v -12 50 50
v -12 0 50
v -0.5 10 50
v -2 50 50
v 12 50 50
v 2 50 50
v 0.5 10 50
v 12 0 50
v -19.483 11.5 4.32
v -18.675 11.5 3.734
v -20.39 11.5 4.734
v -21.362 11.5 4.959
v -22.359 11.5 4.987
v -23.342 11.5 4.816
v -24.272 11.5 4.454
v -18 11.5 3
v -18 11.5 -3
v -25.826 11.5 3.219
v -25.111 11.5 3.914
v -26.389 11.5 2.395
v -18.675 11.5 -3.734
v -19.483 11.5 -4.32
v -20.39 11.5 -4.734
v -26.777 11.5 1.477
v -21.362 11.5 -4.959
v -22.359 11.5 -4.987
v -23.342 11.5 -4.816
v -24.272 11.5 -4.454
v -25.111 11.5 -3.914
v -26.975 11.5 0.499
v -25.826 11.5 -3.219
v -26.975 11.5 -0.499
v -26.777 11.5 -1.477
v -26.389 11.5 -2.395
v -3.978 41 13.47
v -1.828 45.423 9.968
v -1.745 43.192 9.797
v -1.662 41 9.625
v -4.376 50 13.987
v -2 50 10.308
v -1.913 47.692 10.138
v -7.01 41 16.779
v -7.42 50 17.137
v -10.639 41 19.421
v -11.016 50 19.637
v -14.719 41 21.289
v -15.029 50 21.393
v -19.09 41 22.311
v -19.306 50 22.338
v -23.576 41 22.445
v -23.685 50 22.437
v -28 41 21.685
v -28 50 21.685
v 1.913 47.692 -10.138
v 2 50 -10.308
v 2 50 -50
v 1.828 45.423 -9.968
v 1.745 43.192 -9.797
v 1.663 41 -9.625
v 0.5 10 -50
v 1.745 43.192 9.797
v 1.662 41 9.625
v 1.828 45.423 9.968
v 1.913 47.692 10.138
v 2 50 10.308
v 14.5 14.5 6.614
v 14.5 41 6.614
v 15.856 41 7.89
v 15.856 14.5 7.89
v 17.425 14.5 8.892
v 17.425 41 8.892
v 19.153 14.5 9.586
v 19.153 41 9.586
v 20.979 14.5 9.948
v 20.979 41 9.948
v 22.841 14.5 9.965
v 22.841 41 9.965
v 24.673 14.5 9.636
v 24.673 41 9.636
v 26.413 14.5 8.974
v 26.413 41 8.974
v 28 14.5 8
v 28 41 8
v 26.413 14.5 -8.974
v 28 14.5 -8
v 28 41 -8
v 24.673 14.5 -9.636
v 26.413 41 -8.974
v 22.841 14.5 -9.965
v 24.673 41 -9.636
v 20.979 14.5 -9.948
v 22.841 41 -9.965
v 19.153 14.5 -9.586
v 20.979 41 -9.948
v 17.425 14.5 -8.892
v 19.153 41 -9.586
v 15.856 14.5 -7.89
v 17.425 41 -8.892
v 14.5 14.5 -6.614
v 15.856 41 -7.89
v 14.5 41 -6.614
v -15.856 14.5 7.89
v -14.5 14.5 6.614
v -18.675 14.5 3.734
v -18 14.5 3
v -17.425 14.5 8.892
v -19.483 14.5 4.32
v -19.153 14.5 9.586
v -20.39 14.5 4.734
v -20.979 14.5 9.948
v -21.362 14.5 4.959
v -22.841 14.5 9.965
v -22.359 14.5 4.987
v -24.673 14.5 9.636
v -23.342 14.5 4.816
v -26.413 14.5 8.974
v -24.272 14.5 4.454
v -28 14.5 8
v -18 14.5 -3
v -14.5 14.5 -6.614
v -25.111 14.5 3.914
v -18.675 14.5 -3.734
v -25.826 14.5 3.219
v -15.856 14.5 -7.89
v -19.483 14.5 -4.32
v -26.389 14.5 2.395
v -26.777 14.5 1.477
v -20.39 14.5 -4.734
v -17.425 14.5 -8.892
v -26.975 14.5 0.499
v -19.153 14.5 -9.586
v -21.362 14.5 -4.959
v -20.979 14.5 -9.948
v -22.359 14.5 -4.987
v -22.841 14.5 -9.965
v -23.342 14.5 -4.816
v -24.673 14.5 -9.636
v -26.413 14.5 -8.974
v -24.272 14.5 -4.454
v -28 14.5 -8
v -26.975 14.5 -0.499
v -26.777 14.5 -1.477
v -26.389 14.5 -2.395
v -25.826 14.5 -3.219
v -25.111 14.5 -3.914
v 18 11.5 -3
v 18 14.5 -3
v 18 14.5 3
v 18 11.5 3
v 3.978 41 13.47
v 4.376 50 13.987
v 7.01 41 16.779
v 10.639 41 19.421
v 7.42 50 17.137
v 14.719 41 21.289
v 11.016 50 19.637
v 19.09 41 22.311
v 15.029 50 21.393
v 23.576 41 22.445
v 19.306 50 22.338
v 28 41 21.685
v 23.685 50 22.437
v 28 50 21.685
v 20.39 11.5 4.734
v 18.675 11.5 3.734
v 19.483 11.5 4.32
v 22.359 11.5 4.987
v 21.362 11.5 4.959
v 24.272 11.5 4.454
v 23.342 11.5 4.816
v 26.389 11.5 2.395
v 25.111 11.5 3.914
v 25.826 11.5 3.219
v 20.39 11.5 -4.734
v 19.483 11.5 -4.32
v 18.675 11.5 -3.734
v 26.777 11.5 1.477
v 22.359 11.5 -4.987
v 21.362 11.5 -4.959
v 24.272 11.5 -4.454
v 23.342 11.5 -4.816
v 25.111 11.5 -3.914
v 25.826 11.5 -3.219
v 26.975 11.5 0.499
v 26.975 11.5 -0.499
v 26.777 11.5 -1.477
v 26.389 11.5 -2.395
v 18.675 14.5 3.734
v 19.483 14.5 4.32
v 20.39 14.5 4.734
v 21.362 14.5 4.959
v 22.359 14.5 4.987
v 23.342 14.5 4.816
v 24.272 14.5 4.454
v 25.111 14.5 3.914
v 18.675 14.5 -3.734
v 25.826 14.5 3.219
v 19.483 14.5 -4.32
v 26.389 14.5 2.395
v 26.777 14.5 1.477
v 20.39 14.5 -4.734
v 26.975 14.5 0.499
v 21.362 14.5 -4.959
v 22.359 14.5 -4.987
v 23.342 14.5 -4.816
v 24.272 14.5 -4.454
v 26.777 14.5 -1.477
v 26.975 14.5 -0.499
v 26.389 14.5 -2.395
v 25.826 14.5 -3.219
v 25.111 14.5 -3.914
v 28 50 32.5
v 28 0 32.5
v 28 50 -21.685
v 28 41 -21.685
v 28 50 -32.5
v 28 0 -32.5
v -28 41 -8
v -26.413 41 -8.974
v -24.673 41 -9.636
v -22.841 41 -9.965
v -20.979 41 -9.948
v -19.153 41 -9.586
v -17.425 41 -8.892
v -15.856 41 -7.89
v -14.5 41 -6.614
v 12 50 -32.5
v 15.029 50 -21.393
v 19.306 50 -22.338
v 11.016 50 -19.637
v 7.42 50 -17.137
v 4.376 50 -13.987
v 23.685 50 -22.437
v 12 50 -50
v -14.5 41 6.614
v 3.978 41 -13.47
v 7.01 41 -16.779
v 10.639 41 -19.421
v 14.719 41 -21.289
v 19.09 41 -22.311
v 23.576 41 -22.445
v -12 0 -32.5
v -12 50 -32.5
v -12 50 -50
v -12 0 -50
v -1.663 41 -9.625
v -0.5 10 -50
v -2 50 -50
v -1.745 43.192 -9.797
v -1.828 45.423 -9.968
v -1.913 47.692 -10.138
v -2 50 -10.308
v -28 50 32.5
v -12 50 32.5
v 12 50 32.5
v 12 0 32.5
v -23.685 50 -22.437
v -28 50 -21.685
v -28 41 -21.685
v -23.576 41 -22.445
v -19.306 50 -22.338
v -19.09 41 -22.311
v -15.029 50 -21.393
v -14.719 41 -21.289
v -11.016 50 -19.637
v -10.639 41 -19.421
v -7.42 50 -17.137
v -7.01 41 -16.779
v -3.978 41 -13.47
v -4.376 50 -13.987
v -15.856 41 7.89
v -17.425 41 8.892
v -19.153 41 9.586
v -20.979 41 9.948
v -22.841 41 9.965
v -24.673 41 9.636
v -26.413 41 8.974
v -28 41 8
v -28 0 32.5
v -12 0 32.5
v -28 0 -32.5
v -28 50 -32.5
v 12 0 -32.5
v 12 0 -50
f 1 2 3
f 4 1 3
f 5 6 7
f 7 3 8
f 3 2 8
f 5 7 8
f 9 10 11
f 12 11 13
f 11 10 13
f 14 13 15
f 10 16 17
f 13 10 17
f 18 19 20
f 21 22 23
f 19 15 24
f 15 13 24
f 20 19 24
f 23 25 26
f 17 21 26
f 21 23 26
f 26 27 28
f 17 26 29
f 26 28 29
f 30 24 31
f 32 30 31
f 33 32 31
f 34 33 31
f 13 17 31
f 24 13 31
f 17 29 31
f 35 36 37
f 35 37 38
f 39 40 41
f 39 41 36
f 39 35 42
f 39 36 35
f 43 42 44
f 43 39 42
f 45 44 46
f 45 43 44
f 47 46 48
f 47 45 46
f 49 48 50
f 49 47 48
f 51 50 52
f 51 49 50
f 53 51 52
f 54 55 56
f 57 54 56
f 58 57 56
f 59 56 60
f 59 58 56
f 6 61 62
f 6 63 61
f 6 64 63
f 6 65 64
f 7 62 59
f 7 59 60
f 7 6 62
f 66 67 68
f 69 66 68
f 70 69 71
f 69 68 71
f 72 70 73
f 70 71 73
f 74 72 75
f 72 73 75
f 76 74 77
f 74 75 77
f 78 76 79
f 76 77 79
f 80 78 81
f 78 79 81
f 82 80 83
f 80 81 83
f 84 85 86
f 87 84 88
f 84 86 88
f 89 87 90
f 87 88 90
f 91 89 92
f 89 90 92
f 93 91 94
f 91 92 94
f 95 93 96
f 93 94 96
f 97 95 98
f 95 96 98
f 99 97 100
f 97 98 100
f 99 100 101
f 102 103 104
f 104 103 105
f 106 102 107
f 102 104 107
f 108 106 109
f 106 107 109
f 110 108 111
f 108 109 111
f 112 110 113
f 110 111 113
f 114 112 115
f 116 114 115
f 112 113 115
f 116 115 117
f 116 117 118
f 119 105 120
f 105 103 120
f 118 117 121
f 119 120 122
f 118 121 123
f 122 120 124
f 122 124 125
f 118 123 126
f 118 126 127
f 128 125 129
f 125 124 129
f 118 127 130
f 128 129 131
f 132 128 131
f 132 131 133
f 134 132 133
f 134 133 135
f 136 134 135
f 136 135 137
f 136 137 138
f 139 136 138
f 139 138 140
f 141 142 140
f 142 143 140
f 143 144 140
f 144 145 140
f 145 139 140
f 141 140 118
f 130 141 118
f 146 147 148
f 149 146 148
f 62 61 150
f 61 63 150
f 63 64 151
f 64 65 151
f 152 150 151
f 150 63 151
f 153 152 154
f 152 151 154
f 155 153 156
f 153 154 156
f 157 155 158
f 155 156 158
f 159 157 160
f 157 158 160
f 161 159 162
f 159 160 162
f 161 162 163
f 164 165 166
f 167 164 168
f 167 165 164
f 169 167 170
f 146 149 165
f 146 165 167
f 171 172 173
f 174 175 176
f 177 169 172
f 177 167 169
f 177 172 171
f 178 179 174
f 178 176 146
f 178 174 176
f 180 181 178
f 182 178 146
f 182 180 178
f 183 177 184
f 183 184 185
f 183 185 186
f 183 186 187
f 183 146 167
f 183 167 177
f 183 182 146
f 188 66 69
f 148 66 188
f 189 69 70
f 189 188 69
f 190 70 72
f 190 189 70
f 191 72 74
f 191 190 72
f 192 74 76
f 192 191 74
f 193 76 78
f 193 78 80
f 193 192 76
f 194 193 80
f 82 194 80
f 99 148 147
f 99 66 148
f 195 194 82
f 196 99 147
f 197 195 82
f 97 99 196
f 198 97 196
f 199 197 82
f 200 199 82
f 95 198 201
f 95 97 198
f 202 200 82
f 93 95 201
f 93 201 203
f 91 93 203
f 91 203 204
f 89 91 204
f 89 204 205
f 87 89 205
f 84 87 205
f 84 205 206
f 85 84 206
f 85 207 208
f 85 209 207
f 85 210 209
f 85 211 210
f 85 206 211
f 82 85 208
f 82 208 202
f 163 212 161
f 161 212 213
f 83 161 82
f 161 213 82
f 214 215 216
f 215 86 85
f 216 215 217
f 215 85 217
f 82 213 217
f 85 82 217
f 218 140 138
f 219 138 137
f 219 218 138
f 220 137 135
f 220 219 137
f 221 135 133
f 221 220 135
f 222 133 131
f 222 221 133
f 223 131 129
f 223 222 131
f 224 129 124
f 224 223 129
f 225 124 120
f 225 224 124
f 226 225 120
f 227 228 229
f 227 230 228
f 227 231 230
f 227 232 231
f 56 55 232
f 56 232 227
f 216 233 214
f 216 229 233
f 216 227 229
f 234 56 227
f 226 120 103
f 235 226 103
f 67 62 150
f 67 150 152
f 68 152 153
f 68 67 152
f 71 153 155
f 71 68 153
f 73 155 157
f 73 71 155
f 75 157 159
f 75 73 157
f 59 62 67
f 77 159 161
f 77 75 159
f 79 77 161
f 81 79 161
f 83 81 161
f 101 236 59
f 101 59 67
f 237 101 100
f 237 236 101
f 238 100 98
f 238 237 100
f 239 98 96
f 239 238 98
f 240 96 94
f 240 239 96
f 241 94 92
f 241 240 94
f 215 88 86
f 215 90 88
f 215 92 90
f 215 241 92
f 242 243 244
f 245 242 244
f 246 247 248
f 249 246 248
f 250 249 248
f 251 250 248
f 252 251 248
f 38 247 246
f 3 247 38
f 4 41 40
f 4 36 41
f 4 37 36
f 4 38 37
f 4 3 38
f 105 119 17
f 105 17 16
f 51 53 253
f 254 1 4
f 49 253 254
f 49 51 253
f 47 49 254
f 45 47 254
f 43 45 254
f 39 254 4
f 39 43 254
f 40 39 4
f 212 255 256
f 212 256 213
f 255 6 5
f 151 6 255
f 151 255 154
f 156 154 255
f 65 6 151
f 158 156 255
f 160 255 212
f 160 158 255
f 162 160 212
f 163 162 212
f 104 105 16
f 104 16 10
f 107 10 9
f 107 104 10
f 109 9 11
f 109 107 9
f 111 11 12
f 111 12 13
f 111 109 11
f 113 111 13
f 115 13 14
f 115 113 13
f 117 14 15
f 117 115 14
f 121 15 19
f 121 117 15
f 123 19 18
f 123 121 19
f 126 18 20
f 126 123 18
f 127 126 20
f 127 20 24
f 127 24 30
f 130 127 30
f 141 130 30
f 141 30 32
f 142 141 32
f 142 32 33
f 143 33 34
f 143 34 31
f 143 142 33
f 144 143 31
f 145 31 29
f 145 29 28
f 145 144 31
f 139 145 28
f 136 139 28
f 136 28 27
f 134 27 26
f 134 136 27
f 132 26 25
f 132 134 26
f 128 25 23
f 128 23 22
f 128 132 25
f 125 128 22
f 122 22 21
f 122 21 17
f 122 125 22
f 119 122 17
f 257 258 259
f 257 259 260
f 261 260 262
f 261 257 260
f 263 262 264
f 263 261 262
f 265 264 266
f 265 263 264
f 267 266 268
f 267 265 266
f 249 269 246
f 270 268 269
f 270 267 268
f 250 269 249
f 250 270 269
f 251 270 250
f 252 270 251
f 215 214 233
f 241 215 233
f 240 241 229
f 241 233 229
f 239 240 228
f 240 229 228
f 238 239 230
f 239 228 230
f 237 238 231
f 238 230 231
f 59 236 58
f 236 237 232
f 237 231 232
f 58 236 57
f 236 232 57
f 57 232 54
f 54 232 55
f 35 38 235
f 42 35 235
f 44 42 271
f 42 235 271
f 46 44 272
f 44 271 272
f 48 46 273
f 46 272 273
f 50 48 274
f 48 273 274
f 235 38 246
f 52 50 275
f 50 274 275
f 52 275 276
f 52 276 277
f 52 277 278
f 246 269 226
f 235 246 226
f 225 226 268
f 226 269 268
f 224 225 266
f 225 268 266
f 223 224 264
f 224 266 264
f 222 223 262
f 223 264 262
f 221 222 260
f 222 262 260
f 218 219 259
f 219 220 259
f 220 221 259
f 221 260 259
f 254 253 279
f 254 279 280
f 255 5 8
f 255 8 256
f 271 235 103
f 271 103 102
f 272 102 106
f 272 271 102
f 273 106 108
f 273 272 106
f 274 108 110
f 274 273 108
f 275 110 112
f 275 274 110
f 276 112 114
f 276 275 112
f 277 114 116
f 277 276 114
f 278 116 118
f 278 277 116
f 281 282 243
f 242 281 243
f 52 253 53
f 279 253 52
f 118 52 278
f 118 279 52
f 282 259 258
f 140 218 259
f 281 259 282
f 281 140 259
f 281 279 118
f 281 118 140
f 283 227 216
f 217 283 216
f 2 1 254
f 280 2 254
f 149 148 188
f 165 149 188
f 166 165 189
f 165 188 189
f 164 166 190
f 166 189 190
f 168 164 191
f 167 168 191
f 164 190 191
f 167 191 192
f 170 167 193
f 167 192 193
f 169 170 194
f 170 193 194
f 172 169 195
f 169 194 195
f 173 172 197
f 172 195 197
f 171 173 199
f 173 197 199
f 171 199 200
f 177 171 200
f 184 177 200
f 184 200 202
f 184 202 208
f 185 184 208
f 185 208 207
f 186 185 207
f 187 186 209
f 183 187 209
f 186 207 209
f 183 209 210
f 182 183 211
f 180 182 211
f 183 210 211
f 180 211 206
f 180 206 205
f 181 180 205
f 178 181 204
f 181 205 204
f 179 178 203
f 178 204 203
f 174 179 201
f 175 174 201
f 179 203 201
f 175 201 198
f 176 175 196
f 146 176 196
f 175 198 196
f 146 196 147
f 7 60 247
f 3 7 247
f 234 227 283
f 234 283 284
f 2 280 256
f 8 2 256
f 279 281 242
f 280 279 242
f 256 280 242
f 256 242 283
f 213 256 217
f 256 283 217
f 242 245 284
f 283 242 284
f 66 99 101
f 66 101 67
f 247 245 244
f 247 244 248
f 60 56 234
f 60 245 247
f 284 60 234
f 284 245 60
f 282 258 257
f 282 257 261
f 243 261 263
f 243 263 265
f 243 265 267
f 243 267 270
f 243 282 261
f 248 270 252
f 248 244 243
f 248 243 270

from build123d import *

# Parameters (mm, degrees)
SKETCH1_W           = 56
SKETCH1_H           = 100
BOSS_EXTRUDE1_DEPTH = 50
CUT_EXTRUDE2_DEPTH  = 116.256236274
SKETCH7_R           = 22.5
SKETCH7_R_2         = 10
CUT_EXTRUDE4_DEPTH  = 9
CUT_EXTRUDE5_DEPTH  = 35.5
CUT_EXTRUDE6_DEPTH  = 3
CUT_EXTRUDE7_DEPTH  = 9
SKETCH12_W          = 16
SKETCH12_H          = 17.5
CUT_EXTRUDE8_DEPTH  = 77.052613367


with BuildPart() as part:
    # Sketch1 → Boss-Extrude1 (new body)
    with BuildSketch(Plane(origin=(0, 0, 0), x_dir=(1, 0, 0), z_dir=(0, 1, 0))):
        Rectangle(SKETCH1_W, SKETCH1_H)
    extrude(amount=BOSS_EXTRUDE1_DEPTH)

    # Sketch3 → Cut-Extrude2 (cut, through all)
    with BuildSketch(Plane.XY.offset(50)):
        Polygon((-0.5, 10), (-2, 50), (2, 50), (0.5, 10), align=None)
    extrude(amount=-CUT_EXTRUDE2_DEPTH, mode=Mode.SUBTRACT)

    # Sketch7 → Cut-Extrude4 (cut)
    with BuildSketch(Plane(origin=(0, 50, 0), x_dir=(1, 0, 0), z_dir=(0, 1, 0))):
        with Locations((22, 0)):
            Circle(SKETCH7_R)
        with Locations((22, 0)):
            Circle(SKETCH7_R_2, mode=Mode.SUBTRACT)
    cut_extrude4 = extrude(amount=-CUT_EXTRUDE4_DEPTH, mode=Mode.SUBTRACT)

    # Sketch9 → Cut-Extrude5 (cut)
    with BuildSketch(Plane(origin=(0, 50, 0), x_dir=(1, 0, 0), z_dir=(0, 1, 0))):
        with BuildLine():
            Line((14.5, 6.614378278), (14.5, -6.614378278))
            ThreePointArc((14.5, -6.614378278), (32, 0), (14.5, 6.614378278))
        make_face()
    cut_extrude5 = extrude(amount=-CUT_EXTRUDE5_DEPTH, mode=Mode.SUBTRACT)

    # Sketch10 → Cut-Extrude6 (cut)
    with BuildSketch(Plane(origin=(0, 14.5, 0), x_dir=(1, 0, 0), z_dir=(0, 1, 0))):
        with BuildLine():
            Line((18, 3), (18, -3))
            ThreePointArc((18, -3), (27, 0), (18, 3))
        make_face()
    cut_extrude6 = extrude(amount=-CUT_EXTRUDE6_DEPTH, mode=Mode.SUBTRACT)

    # Sketch11 → Cut-Extrude7 (cut)
    with BuildSketch(Plane(origin=(0, 50, 0), x_dir=(1, 0, 0), z_dir=(0, 1, 0))):
        with BuildLine():
            Line((14.5, 6.614378278), (14.5, -6.614378278))
            ThreePointArc((14.5, -6.614378278), (12, 0), (14.5, 6.614378278))
        make_face()
    cut_extrude7 = extrude(amount=-CUT_EXTRUDE7_DEPTH, mode=Mode.SUBTRACT)

    # Mirror1: Cut-Extrude4, Cut-Extrude5, Cut-Extrude6, Cut-Extrude7 across plane
    add(cut_extrude4.mirror(Plane(origin=(0, 0, 0), x_dir=(0, 0, 1), z_dir=(1, 0, 0))), mode=Mode.SUBTRACT)
    add(cut_extrude5.mirror(Plane(origin=(0, 0, 0), x_dir=(0, 0, 1), z_dir=(1, 0, 0))), mode=Mode.SUBTRACT)
    add(cut_extrude6.mirror(Plane(origin=(0, 0, 0), x_dir=(0, 0, 1), z_dir=(1, 0, 0))), mode=Mode.SUBTRACT)
    add(cut_extrude7.mirror(Plane(origin=(0, 0, 0), x_dir=(0, 0, 1), z_dir=(1, 0, 0))), mode=Mode.SUBTRACT)

    # Sketch12 → Cut-Extrude8 (cut, through all)
    with BuildSketch(Plane(origin=(0, 50, 0), x_dir=(1, 0, 0), z_dir=(0, 1, 0))):
        with Locations((-20, 41.25)):
            Rectangle(SKETCH12_W, SKETCH12_H)
        with Locations((20, 41.25)):
            Rectangle(SKETCH12_W, SKETCH12_H)
        with Locations((-20, -41.25)):
            Rectangle(SKETCH12_W, SKETCH12_H)
        with Locations((20, -41.25)):
            Rectangle(SKETCH12_W, SKETCH12_H)
    extrude(amount=-CUT_EXTRUDE8_DEPTH, mode=Mode.SUBTRACT)


solid = part.part
